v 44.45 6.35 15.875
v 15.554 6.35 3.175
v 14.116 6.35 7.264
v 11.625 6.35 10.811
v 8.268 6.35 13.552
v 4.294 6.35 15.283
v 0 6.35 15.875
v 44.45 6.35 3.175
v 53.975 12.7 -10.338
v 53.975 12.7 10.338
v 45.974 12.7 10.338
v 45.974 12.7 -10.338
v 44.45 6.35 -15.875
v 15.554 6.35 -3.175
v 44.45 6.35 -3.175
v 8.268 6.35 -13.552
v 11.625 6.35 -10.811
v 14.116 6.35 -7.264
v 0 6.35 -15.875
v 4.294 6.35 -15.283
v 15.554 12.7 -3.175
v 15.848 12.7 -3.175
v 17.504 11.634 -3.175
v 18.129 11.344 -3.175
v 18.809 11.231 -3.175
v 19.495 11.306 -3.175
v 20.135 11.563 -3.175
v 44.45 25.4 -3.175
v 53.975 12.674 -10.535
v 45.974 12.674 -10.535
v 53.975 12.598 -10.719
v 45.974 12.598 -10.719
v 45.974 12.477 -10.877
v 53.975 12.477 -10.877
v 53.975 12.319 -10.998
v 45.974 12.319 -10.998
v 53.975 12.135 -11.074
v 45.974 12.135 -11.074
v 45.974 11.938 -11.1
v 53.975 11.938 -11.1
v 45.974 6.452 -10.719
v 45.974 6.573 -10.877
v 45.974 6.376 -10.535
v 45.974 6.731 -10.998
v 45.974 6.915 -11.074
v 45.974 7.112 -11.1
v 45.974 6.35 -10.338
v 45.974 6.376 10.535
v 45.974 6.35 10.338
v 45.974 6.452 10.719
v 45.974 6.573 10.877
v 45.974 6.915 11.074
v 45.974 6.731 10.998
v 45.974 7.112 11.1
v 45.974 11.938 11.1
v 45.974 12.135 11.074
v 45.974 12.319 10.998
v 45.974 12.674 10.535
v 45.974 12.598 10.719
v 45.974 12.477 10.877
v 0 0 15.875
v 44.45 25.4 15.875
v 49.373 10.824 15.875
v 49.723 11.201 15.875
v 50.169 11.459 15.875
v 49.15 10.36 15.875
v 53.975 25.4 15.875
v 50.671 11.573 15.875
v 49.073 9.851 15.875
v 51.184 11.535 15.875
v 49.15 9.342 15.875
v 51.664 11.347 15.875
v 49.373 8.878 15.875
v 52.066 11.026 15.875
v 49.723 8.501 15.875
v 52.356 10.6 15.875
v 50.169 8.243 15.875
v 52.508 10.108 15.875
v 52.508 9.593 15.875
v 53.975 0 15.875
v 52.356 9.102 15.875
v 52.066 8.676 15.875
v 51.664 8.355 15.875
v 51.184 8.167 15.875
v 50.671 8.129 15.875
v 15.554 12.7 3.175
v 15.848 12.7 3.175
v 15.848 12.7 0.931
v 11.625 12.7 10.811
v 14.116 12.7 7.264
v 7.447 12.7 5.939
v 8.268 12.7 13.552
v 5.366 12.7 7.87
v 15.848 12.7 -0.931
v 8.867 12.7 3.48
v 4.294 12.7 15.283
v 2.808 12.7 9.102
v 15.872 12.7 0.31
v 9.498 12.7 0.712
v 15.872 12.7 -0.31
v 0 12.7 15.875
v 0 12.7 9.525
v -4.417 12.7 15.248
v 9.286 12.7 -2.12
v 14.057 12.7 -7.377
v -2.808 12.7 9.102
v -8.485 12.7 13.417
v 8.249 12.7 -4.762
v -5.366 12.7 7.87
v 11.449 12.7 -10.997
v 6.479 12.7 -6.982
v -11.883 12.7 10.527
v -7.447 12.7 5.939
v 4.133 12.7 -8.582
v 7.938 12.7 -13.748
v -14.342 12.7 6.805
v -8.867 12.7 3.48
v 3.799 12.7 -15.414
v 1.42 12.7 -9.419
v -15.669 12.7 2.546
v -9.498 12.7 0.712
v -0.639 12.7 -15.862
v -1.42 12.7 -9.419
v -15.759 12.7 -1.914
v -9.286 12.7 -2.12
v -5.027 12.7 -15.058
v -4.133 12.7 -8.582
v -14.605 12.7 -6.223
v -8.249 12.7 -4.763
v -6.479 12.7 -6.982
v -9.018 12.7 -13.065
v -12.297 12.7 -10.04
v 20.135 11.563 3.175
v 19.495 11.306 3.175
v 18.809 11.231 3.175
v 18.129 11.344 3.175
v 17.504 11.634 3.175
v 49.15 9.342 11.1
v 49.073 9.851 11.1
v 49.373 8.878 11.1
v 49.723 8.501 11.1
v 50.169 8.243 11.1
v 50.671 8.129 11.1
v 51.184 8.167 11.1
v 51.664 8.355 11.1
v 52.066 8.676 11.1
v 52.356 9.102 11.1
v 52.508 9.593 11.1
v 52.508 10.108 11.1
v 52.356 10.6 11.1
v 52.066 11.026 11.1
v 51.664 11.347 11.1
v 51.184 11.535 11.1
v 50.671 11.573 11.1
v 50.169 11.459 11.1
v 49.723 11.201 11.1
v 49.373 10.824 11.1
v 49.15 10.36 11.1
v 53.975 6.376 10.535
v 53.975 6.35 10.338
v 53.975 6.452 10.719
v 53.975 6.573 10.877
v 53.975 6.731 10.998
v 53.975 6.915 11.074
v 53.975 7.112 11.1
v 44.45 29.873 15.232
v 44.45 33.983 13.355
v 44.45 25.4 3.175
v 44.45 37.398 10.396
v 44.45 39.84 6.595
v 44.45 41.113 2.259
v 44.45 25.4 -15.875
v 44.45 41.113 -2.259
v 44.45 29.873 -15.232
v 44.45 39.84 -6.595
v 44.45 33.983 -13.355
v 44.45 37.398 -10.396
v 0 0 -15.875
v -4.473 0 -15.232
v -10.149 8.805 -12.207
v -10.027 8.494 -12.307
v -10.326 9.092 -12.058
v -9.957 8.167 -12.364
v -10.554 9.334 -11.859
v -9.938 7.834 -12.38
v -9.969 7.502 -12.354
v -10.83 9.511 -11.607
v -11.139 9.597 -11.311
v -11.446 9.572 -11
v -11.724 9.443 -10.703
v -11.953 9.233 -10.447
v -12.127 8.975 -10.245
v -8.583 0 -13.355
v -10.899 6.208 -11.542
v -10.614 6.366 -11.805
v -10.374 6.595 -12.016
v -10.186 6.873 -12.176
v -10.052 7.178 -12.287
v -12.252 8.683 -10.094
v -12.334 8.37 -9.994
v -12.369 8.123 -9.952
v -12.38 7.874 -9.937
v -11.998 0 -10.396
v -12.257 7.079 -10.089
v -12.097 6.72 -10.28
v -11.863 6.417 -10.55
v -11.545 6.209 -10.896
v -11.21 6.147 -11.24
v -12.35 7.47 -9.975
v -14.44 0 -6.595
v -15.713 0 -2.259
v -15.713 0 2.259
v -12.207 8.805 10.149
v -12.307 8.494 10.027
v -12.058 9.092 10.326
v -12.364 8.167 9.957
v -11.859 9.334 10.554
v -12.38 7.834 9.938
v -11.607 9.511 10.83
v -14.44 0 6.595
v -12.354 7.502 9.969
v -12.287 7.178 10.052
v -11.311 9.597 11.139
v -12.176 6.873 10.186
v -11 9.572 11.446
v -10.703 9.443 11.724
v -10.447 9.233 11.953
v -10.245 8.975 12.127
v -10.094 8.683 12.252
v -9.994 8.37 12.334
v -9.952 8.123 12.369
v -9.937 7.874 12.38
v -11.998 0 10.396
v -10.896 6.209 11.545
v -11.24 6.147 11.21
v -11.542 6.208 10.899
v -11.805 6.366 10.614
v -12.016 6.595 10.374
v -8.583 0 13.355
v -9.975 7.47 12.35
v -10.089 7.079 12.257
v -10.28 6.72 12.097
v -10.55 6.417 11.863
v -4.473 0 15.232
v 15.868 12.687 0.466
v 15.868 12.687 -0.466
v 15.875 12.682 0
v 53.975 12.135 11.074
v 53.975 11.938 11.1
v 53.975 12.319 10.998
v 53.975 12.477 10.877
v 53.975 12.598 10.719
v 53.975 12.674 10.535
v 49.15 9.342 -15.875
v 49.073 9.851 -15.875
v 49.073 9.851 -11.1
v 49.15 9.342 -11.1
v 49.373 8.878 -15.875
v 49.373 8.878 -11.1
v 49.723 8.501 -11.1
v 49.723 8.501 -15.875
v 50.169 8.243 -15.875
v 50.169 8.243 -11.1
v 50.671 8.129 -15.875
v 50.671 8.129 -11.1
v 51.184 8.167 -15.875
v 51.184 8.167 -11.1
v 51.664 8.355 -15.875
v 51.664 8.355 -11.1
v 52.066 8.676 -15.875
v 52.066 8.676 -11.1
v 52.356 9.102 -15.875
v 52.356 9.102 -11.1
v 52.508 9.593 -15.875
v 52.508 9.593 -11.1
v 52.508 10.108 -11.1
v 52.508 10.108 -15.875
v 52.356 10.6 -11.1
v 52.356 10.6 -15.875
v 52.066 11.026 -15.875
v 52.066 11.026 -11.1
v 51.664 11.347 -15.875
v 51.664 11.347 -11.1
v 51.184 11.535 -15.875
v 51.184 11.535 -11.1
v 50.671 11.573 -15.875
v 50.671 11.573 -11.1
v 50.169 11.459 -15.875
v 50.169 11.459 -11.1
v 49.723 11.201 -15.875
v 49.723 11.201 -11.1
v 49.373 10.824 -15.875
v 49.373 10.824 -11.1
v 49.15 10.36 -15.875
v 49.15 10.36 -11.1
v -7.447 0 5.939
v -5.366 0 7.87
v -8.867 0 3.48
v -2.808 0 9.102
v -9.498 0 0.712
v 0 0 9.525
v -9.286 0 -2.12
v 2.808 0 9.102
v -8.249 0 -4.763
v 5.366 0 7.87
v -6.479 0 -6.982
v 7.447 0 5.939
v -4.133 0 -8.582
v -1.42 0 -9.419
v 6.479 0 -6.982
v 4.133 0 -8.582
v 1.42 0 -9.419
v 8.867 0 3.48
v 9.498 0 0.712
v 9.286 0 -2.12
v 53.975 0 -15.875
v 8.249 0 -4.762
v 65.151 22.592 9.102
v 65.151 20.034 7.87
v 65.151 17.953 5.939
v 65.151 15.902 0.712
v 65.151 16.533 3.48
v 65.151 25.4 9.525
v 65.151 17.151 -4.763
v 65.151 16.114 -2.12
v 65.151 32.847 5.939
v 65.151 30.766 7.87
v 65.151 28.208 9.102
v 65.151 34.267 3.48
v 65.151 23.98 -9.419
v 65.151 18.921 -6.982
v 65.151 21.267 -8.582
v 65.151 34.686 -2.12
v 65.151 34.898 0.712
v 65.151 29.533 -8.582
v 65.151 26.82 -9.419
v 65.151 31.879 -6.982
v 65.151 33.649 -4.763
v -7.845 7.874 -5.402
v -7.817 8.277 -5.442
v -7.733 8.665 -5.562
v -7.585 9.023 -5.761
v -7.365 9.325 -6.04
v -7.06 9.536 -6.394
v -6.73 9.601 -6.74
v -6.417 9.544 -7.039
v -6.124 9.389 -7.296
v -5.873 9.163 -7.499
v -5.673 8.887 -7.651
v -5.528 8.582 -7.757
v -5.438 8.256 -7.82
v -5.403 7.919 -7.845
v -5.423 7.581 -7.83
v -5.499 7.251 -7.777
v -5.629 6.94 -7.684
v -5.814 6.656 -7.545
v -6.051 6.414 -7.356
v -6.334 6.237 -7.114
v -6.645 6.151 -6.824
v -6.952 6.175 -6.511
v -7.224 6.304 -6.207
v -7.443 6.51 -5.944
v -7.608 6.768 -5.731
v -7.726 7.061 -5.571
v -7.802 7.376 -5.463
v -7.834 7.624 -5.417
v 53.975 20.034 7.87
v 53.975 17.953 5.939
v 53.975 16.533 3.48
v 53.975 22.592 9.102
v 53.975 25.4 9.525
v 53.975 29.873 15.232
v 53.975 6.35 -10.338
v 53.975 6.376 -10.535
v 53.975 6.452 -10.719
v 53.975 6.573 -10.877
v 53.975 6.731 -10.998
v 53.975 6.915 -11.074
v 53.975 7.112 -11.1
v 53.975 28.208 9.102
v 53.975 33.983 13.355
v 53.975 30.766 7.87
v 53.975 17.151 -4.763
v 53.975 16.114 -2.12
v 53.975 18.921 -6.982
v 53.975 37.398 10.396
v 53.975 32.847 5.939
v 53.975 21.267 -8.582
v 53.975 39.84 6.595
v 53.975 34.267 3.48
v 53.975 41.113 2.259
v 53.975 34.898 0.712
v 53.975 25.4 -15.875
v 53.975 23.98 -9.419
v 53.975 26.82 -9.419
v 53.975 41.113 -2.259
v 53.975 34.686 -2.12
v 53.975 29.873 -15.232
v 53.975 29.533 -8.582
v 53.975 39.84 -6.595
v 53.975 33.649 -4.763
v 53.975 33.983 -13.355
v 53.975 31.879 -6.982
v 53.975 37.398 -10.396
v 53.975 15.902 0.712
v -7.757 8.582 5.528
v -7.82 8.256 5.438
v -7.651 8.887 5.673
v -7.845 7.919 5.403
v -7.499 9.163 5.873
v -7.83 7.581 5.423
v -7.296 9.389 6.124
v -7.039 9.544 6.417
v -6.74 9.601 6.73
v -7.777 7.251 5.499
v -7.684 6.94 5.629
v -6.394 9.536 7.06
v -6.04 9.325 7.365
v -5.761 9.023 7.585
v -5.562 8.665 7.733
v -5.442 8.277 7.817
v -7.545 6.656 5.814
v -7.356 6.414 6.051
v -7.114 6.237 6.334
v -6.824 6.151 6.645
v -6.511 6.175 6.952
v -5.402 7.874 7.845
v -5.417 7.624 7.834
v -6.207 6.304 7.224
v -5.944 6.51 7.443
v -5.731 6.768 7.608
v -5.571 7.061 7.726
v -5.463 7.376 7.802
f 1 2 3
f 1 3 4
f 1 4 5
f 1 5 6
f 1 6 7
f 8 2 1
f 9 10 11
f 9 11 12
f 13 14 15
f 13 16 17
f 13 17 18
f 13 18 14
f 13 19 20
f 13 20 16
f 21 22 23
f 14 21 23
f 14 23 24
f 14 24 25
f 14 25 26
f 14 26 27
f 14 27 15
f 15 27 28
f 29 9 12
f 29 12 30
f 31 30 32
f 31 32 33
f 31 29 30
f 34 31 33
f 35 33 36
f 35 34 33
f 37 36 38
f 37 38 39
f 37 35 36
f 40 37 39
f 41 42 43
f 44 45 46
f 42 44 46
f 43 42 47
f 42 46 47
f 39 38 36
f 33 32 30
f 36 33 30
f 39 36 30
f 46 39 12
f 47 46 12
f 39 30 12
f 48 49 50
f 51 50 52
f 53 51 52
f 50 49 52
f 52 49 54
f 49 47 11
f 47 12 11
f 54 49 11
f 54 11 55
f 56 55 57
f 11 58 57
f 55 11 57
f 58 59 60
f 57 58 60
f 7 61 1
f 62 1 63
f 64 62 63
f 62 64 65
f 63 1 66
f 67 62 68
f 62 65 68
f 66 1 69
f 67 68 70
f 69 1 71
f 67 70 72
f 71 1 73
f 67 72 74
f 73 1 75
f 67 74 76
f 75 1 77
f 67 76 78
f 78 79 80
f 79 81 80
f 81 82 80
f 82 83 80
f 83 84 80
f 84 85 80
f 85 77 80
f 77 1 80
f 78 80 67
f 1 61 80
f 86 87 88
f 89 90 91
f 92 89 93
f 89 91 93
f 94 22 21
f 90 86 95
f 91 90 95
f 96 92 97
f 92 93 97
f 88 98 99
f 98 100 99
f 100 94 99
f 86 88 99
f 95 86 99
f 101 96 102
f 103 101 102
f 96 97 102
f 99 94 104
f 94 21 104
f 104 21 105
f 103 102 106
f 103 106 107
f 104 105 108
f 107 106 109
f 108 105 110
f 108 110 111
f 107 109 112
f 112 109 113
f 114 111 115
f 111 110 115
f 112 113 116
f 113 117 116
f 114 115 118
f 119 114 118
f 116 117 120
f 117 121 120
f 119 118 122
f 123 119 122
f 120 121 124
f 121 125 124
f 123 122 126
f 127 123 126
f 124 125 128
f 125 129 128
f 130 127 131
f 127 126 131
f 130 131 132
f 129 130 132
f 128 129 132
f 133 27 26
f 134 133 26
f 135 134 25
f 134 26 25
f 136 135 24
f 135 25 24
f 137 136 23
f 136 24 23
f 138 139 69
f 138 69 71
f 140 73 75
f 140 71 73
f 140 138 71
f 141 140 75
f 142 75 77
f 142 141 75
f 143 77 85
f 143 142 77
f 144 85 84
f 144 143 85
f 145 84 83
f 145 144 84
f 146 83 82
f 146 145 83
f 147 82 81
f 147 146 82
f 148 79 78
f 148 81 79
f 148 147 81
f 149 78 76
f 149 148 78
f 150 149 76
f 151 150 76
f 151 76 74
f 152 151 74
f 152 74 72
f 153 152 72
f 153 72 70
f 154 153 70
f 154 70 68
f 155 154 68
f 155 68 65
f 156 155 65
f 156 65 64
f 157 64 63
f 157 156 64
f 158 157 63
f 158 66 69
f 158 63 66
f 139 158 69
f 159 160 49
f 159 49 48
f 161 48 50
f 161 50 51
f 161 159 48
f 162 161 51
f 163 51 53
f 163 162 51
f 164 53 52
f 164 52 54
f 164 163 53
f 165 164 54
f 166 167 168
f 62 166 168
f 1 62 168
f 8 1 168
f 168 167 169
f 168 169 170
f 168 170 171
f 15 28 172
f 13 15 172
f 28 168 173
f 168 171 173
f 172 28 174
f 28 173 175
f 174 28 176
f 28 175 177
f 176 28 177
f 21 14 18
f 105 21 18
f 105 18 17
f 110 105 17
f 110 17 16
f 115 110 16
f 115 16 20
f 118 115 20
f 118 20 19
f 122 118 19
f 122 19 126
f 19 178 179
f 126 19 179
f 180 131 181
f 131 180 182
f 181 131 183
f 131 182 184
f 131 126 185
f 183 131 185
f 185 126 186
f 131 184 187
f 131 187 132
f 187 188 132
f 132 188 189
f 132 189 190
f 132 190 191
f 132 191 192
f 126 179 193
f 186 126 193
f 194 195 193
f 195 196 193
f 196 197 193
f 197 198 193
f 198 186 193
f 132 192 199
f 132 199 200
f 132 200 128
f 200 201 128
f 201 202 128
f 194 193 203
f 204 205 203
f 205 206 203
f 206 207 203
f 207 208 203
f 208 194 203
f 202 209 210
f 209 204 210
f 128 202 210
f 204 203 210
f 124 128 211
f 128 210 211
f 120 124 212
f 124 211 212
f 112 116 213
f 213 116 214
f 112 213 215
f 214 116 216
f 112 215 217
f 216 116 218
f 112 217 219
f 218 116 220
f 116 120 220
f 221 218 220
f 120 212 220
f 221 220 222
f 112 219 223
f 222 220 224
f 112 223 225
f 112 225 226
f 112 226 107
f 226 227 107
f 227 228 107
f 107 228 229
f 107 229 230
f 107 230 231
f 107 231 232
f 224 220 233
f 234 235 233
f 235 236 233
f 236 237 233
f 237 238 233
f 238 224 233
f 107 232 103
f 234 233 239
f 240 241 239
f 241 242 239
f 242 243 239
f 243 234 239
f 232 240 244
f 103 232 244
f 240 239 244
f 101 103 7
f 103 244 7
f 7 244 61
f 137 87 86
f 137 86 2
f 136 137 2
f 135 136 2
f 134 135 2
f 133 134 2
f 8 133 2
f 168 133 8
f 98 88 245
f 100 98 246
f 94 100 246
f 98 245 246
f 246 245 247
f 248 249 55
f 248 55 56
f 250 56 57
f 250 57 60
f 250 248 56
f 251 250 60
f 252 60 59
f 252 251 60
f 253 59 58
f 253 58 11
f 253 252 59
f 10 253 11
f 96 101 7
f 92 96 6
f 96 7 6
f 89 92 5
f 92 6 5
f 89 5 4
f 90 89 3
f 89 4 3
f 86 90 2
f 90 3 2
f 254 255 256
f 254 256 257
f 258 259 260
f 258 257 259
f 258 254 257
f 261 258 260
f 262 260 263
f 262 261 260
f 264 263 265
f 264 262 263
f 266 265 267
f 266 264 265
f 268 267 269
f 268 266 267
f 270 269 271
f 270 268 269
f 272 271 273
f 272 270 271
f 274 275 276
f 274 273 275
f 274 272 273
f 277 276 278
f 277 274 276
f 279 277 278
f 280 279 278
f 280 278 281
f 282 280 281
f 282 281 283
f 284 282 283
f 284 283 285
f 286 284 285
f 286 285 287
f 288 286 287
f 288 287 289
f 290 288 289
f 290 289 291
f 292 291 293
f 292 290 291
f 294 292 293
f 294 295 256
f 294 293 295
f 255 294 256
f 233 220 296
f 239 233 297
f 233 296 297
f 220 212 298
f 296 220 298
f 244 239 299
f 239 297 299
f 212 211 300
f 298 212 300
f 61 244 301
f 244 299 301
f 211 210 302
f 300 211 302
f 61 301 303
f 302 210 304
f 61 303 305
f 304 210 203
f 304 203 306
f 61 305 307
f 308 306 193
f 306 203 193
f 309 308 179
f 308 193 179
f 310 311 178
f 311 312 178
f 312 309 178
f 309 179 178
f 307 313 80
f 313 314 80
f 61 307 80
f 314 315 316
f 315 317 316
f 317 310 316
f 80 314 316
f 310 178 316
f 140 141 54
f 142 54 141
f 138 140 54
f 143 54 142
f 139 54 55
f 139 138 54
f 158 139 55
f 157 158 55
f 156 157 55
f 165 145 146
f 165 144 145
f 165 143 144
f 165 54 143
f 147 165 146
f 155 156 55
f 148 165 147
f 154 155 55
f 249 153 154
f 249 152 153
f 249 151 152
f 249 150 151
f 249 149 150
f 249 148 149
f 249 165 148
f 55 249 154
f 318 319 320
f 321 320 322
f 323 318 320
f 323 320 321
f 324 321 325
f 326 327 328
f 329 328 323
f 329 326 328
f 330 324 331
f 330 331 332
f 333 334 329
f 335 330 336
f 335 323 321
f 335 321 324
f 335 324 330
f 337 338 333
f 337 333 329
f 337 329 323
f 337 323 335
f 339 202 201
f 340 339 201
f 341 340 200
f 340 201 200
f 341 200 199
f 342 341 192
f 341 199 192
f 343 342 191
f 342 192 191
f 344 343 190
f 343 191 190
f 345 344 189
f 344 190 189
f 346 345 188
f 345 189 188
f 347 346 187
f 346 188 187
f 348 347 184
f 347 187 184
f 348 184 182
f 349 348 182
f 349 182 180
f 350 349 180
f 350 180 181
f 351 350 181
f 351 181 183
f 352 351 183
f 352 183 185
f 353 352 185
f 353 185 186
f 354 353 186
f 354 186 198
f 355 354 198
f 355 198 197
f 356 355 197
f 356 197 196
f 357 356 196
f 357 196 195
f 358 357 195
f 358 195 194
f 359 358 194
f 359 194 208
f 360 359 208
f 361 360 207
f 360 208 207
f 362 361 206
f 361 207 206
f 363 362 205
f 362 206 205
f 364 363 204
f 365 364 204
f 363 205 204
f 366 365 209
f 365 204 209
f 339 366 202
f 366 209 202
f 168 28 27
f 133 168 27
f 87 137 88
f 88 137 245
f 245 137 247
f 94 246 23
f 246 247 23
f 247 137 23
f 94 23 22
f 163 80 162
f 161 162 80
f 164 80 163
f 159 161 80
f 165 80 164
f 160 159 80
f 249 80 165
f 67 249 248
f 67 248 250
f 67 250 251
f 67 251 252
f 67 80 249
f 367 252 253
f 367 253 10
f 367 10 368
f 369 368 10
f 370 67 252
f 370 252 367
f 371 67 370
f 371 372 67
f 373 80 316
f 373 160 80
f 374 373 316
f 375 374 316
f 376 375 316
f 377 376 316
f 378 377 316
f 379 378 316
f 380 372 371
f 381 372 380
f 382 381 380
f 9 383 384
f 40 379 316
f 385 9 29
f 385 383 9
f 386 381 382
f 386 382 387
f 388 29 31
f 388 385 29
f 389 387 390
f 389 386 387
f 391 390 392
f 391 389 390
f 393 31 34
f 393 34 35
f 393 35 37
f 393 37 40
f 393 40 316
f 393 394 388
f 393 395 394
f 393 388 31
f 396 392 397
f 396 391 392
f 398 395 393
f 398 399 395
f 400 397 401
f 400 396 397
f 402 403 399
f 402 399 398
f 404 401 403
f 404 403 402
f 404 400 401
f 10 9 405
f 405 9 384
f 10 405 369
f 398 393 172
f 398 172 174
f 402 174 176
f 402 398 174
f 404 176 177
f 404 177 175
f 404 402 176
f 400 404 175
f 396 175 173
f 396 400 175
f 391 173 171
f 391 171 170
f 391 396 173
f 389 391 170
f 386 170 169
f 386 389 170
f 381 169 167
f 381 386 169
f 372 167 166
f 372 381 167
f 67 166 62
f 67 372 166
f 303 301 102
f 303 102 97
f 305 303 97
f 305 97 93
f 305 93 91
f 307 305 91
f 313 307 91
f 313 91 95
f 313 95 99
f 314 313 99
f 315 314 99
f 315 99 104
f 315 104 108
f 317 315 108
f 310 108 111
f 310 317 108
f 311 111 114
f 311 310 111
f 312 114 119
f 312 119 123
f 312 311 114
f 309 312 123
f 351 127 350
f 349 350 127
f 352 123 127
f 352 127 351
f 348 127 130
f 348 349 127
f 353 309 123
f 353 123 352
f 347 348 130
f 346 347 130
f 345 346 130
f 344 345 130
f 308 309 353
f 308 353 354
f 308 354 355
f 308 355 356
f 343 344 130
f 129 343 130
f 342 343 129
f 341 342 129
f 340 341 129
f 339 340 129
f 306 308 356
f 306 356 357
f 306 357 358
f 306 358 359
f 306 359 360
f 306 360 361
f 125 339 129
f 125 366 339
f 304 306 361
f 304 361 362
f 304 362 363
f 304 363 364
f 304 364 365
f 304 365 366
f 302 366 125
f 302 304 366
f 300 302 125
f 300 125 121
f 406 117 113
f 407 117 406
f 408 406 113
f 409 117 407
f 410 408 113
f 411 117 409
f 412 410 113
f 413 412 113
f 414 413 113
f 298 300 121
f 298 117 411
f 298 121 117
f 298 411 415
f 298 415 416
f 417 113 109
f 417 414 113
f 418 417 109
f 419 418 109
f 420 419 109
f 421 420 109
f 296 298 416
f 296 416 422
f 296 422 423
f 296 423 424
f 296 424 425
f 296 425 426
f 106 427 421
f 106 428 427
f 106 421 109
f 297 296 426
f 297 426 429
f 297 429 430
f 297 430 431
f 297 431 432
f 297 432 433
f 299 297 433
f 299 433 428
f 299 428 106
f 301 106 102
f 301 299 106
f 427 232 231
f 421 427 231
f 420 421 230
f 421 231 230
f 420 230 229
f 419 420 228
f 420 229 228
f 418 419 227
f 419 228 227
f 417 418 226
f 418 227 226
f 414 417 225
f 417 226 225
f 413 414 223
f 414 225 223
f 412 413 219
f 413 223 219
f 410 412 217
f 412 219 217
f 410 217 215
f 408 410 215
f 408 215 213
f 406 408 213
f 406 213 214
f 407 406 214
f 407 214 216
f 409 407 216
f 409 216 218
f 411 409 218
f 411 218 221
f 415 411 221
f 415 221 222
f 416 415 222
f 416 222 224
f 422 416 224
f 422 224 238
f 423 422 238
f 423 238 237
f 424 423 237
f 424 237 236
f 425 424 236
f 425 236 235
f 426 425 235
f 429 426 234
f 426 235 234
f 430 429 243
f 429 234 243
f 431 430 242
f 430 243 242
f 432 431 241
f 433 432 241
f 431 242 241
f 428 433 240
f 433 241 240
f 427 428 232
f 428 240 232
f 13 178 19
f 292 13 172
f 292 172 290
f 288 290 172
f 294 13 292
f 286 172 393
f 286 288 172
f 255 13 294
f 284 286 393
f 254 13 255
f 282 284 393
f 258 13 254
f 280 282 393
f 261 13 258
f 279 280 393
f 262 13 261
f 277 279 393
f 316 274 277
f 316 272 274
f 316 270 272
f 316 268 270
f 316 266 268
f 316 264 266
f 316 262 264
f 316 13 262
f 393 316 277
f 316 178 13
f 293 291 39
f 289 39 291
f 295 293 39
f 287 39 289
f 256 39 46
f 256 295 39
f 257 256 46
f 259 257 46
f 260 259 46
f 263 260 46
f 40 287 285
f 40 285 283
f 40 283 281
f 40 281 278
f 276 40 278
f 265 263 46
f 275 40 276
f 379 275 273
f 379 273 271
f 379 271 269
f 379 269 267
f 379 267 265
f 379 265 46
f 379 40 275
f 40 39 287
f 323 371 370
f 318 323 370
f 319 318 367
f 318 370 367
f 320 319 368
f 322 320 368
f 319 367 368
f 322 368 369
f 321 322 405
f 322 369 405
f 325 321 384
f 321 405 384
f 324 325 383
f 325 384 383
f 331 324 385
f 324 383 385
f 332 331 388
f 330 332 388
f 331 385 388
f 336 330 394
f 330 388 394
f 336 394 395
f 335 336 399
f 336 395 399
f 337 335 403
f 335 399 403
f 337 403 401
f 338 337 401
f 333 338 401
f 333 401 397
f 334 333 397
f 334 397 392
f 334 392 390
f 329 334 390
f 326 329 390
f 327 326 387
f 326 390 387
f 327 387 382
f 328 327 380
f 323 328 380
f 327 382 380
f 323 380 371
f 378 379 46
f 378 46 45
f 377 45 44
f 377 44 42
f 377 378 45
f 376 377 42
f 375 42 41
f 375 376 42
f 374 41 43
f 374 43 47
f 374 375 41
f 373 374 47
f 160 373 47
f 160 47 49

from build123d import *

# Parameters (mm, degrees)
SKETCH1_R               = 15.875
SKETCH1_R_2             = 9.525
BOSS_EXTRUDE1_DEPTH     = 12.7
SKETCH10_R              = 1.7272
CUT_EXTRUDE3_DEPTH      = 12.7
SKETCH5_R               = 1.7272
CUT_EXTRUDE4_DEPTH      = 12.7
BOSS_EXTRUDE6_DEPTH     = 6.35
SKETCH1_9_W             = 9.525
SKETCH1_9_H             = 31.75
BOSS_EXTRUDE7_DEPTH     = 25.4
RIB18_START             = -3.175
RIB18_DEPTH             = 6.35
CUT_EXTRUDE5_DEPTH      = 8.001
BOSS_EXTRUDE8_DEPTH     = 9.525
BOSS_EXTRUDE9_DEPTH     = 11.176
CUT_EXTRUDE6_DEPTH      = 44.196
CUT_EXTRUDE6_DEPTH_BACK = 50.8
SKETCH22_R              = 1.7272


with BuildPart() as part:
    # Sketch1 → Boss-Extrude1 (new body)
    with BuildSketch(Plane(origin=(0, 0, 0), x_dir=(1, 0, 0), z_dir=(0, 1, 0))):
        with Locations(Location((0, 0, 0), (0, 0, 270))):
            Circle(SKETCH1_R)
        with Locations(Location((0, 0, 0), (0, 0, 270))):
            Circle(SKETCH1_R_2, mode=Mode.SUBTRACT)
    extrude(amount=BOSS_EXTRUDE1_DEPTH)

    # Sketch10 → Cut-Extrude3 (cut)
    with BuildSketch(Plane(origin=(-11.225320151, 0, -11.225320151), x_dir=(-0.7071067811865486, 0, 0.7071067811865465), z_dir=(-0.7071067811865465, 0, -0.7071067811865486))):
        with Locations((0, 7.874)):
            Circle(SKETCH10_R)
    extrude(amount=-CUT_EXTRUDE3_DEPTH, mode=Mode.SUBTRACT)

    # Sketch5 → Cut-Extrude4 (cut)
    with BuildSketch(Plane(origin=(-11.225320151, 0, 11.225320151), x_dir=(0.7071067811865488, 0, 0.7071067811865464), z_dir=(-0.7071067811865464, 0, 0.7071067811865488))):
        with Locations((0, 7.874)):
            Circle(SKETCH5_R)
    extrude(amount=-CUT_EXTRUDE4_DEPTH, mode=Mode.SUBTRACT)

    # Sketch1<8> → Boss-Extrude6 (add)
    with BuildSketch(Plane(origin=(0, 0, 0), x_dir=(1, 0, 0), z_dir=(0, 1, 0))):
        with BuildLine():
            Line((0, -15.875), (15.875, -15.875))
            Line((15.875, -15.875), (15.875, 0))
            ThreePointArc((15.875, 0), (11.225320151, -11.225320151), (0, -15.875))
        make_face()
        with BuildLine():
            Line((15.875, 0), (15.875, 15.875))
            Line((15.875, 15.875), (0, 15.875))
            ThreePointArc((0, 15.875), (11.225320151, 11.225320151), (15.875, 0))
        make_face()
        Polygon((44.45, -15.875), (44.45, 15.875), (15.875, 15.875), (15.875, 0), (15.875, -15.875), align=None)
    extrude(amount=BOSS_EXTRUDE6_DEPTH)

    # Sketch1<9> → Boss-Extrude7 (add)
    with BuildSketch(Plane(origin=(0, 0, 0), x_dir=(1, 0, 0), z_dir=(0, 1, 0))):
        with Locations((49.2125, 0)):
            Rectangle(SKETCH1_9_W, SKETCH1_9_H)
    extrude(amount=BOSS_EXTRUDE7_DEPTH)

    # Rib18: read off the stored shape, not the designer's step
    # Rib18 outline → Rib18 (add)
    with BuildSketch(Plane.XY.offset(RIB18_START)):
        with BuildLine():
            Line((15.847686346, 12.7), (15.554259867, 12.7))
            Line((15.554259867, 12.7), (15.554259867, 6.35))
            Line((15.554259867, 6.35), (44.45, 6.35))
            Line((44.45, 6.35), (44.45, 25.4))
            Line((44.45, 25.4), (20.13457386, 11.562910878))
            ThreePointArc((20.13457386, 11.562910878), (18.809330508, 11.231428329), (17.504040967, 11.634379737))
            Line((17.504040967, 11.634379737), (15.847686346, 12.7))
        make_face()
    extrude(amount=RIB18_DEPTH)

    # Sketch20 → Cut-Extrude5 (cut)
    with BuildSketch(Plane(origin=(53.975, 0, 0), x_dir=(0, 0, -1), z_dir=(1, 0, 0))):
        with BuildLine():
            ThreePointArc((-10.3378, 6.35), (-10.876615367, 6.573184633), (-11.0998, 7.112))
            Line((-11.0998, 7.112), (-11.0998, 11.938))
            ThreePointArc((-11.0998, 11.938), (-10.876615367, 12.476815367), (-10.3378, 12.7))
            Line((-10.3378, 12.7), (10.3378, 12.7))
            ThreePointArc((10.3378, 12.7), (10.876615367, 12.476815367), (11.0998, 11.938))
            Line((11.0998, 11.938), (11.0998, 7.112))
            ThreePointArc((11.0998, 7.112), (10.876615367, 6.573184633), (10.3378, 6.35))
            Line((10.3378, 6.35), (-10.3378, 6.35))
        make_face()
    extrude(amount=-CUT_EXTRUDE5_DEPTH, mode=Mode.SUBTRACT)

    # Sketch20<3> → Boss-Extrude8 (add)
    with BuildSketch(Plane(origin=(53.975, 0, 0), x_dir=(0, 0, -1), z_dir=(1, 0, 0))):
        with BuildLine():
            Line((-15.875, 25.4), (-9.525, 25.4))
            ThreePointArc((-9.525, 25.4), (0, 34.925), (9.525, 25.4))
            Line((9.525, 25.4), (15.875, 25.4))
            ThreePointArc((15.875, 25.4), (0, 41.275), (-15.875, 25.4))
        make_face()
        with BuildLine():
            ThreePointArc((9.525, 25.4), (0, 34.925), (-9.525, 25.4))
            Line((-9.525, 25.4), (9.525, 25.4))
        make_face()
        with BuildLine():
            Line((9.525, 25.4), (-9.525, 25.4))
            ThreePointArc((-9.525, 25.4), (0, 15.875), (9.525, 25.4))
        make_face()
    extrude(amount=-BOSS_EXTRUDE8_DEPTH)

    # Sketch20<4> → Boss-Extrude9 (add)
    with BuildSketch(Plane(origin=(53.975, 0, 0), x_dir=(0, 0, -1), z_dir=(1, 0, 0))):
        with BuildLine():
            ThreePointArc((9.525, 25.4), (0, 34.925), (-9.525, 25.4))
            Line((-9.525, 25.4), (9.525, 25.4))
        make_face()
        with BuildLine():
            Line((9.525, 25.4), (-9.525, 25.4))
            ThreePointArc((-9.525, 25.4), (0, 15.875), (9.525, 25.4))
        make_face()
    extrude(amount=BOSS_EXTRUDE9_DEPTH)

    # Sketch22 → Cut-Extrude6 (cut, two sides: drawn at the far end of the back side and taken through both)
    with BuildSketch(Plane.XY.offset(-CUT_EXTRUDE6_DEPTH_BACK)):
        with Locations(Location((50.8, 9.850914973, 0), (0, 0, 180))):
            Circle(SKETCH22_R)
    extrude(amount=CUT_EXTRUDE6_DEPTH + CUT_EXTRUDE6_DEPTH_BACK, mode=Mode.SUBTRACT)


solid = part.part
